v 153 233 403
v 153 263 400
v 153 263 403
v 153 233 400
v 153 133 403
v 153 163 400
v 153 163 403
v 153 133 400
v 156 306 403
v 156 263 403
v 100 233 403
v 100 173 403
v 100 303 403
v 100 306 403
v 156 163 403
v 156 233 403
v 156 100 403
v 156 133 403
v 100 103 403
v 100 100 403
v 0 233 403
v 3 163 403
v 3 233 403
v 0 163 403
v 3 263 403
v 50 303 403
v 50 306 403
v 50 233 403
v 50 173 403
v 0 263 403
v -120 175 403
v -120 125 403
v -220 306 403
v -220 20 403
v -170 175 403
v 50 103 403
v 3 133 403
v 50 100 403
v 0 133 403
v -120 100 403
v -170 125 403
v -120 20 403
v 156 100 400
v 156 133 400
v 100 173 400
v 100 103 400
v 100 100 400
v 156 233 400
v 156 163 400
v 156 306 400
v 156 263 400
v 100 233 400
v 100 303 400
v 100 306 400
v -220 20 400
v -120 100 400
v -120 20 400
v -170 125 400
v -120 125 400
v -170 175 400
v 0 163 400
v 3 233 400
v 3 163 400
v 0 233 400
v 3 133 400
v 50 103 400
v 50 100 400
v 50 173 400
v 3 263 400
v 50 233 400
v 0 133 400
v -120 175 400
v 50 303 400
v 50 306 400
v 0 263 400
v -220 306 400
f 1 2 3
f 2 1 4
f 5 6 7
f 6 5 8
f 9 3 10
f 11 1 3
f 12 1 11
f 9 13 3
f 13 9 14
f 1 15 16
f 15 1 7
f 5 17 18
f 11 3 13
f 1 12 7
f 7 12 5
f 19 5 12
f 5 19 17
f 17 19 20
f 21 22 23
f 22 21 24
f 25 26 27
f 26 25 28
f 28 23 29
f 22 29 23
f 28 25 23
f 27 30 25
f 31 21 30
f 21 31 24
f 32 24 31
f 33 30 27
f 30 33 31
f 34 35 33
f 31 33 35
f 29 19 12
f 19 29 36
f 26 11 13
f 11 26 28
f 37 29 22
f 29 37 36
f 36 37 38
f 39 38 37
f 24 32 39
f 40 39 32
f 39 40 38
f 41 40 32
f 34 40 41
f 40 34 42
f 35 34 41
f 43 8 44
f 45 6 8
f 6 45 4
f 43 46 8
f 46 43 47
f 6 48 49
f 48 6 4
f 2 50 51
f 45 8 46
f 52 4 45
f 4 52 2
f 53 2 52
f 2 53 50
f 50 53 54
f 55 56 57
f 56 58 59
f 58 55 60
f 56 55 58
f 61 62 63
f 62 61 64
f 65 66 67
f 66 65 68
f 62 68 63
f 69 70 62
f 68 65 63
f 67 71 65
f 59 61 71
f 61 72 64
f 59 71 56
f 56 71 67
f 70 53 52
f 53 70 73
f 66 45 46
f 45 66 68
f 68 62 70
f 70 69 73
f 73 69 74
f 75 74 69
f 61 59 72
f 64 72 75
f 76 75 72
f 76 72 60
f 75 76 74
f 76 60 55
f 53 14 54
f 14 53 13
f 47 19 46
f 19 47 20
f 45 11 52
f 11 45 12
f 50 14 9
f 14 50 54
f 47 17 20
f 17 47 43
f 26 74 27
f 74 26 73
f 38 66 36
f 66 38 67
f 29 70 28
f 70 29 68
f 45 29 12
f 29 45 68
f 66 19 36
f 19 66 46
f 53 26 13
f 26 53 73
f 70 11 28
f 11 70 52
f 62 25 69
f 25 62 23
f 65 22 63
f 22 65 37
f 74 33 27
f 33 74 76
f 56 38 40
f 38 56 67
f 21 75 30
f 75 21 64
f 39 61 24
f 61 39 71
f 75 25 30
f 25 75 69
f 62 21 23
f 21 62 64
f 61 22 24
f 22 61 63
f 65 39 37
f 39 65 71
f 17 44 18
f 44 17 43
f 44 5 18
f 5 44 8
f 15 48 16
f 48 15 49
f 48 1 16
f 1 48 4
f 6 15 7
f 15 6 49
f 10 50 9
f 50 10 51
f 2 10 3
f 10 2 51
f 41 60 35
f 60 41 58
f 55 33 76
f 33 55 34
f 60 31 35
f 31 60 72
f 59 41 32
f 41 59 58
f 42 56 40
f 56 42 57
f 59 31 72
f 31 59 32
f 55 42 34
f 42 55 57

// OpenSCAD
module part07(){
    
    // stripe right
    translate([100,100,400]) color("green") cube([53,206,3]);
    
    //hole in the middle 
    translate([50,103,400]) color("green") cube([50,70,3]);
    translate([50,233,400]) color("green") cube([50,70,3]);
    
    // column left stripe
    translate([3,100,400]) color("green") cube([47,206,3]);
    
    
    // connectors
    
    // mitte hinten
    translate([0,263,400]) color("green") cube([3,43,3]);
    // mitte mitte
    translate([0,163,400]) color("green") cube([3,70,3]);
    translate([0,100,400]) color("green") cube([3,33,3]);
    
    // rechts vorne
    translate([153,100,400]) color("green") cube([3,33,3]);
    
    // rechts mitte
    translate([153,163,400]) color("green") cube([3,70,3]);
    
    // rechts hinten
    translate([153,263,400]) color("green") cube([3,43,3]);
    
    
    // arm right stripe
    translate([-50,100,400]) color("green") cube([50,206,3]);
    
    translate([-220,125,400]) color("green") cube([50,50,3]);
    translate([-120,100,400]) color("green") cube([70,206,3]);
    
    // ueberhang vorne
    translate([-220,20,400]) color("green") cube([100,105,3]);
    // hinten links
    translate([-220,175,400]) color("green") cube([100,131,3]);
}

//use <part01.scad>;
//use <part02.scad>;
//use <part03.scad>;
//use <part04.scad>;
//use <part05.scad>;
//use <part06.scad>;
//part01();
//part02();
//part03();
//// zweites Seitenteil
//translate([15.3,0,0]) part03();
//part04();
//part05();
//part06();
part07();
